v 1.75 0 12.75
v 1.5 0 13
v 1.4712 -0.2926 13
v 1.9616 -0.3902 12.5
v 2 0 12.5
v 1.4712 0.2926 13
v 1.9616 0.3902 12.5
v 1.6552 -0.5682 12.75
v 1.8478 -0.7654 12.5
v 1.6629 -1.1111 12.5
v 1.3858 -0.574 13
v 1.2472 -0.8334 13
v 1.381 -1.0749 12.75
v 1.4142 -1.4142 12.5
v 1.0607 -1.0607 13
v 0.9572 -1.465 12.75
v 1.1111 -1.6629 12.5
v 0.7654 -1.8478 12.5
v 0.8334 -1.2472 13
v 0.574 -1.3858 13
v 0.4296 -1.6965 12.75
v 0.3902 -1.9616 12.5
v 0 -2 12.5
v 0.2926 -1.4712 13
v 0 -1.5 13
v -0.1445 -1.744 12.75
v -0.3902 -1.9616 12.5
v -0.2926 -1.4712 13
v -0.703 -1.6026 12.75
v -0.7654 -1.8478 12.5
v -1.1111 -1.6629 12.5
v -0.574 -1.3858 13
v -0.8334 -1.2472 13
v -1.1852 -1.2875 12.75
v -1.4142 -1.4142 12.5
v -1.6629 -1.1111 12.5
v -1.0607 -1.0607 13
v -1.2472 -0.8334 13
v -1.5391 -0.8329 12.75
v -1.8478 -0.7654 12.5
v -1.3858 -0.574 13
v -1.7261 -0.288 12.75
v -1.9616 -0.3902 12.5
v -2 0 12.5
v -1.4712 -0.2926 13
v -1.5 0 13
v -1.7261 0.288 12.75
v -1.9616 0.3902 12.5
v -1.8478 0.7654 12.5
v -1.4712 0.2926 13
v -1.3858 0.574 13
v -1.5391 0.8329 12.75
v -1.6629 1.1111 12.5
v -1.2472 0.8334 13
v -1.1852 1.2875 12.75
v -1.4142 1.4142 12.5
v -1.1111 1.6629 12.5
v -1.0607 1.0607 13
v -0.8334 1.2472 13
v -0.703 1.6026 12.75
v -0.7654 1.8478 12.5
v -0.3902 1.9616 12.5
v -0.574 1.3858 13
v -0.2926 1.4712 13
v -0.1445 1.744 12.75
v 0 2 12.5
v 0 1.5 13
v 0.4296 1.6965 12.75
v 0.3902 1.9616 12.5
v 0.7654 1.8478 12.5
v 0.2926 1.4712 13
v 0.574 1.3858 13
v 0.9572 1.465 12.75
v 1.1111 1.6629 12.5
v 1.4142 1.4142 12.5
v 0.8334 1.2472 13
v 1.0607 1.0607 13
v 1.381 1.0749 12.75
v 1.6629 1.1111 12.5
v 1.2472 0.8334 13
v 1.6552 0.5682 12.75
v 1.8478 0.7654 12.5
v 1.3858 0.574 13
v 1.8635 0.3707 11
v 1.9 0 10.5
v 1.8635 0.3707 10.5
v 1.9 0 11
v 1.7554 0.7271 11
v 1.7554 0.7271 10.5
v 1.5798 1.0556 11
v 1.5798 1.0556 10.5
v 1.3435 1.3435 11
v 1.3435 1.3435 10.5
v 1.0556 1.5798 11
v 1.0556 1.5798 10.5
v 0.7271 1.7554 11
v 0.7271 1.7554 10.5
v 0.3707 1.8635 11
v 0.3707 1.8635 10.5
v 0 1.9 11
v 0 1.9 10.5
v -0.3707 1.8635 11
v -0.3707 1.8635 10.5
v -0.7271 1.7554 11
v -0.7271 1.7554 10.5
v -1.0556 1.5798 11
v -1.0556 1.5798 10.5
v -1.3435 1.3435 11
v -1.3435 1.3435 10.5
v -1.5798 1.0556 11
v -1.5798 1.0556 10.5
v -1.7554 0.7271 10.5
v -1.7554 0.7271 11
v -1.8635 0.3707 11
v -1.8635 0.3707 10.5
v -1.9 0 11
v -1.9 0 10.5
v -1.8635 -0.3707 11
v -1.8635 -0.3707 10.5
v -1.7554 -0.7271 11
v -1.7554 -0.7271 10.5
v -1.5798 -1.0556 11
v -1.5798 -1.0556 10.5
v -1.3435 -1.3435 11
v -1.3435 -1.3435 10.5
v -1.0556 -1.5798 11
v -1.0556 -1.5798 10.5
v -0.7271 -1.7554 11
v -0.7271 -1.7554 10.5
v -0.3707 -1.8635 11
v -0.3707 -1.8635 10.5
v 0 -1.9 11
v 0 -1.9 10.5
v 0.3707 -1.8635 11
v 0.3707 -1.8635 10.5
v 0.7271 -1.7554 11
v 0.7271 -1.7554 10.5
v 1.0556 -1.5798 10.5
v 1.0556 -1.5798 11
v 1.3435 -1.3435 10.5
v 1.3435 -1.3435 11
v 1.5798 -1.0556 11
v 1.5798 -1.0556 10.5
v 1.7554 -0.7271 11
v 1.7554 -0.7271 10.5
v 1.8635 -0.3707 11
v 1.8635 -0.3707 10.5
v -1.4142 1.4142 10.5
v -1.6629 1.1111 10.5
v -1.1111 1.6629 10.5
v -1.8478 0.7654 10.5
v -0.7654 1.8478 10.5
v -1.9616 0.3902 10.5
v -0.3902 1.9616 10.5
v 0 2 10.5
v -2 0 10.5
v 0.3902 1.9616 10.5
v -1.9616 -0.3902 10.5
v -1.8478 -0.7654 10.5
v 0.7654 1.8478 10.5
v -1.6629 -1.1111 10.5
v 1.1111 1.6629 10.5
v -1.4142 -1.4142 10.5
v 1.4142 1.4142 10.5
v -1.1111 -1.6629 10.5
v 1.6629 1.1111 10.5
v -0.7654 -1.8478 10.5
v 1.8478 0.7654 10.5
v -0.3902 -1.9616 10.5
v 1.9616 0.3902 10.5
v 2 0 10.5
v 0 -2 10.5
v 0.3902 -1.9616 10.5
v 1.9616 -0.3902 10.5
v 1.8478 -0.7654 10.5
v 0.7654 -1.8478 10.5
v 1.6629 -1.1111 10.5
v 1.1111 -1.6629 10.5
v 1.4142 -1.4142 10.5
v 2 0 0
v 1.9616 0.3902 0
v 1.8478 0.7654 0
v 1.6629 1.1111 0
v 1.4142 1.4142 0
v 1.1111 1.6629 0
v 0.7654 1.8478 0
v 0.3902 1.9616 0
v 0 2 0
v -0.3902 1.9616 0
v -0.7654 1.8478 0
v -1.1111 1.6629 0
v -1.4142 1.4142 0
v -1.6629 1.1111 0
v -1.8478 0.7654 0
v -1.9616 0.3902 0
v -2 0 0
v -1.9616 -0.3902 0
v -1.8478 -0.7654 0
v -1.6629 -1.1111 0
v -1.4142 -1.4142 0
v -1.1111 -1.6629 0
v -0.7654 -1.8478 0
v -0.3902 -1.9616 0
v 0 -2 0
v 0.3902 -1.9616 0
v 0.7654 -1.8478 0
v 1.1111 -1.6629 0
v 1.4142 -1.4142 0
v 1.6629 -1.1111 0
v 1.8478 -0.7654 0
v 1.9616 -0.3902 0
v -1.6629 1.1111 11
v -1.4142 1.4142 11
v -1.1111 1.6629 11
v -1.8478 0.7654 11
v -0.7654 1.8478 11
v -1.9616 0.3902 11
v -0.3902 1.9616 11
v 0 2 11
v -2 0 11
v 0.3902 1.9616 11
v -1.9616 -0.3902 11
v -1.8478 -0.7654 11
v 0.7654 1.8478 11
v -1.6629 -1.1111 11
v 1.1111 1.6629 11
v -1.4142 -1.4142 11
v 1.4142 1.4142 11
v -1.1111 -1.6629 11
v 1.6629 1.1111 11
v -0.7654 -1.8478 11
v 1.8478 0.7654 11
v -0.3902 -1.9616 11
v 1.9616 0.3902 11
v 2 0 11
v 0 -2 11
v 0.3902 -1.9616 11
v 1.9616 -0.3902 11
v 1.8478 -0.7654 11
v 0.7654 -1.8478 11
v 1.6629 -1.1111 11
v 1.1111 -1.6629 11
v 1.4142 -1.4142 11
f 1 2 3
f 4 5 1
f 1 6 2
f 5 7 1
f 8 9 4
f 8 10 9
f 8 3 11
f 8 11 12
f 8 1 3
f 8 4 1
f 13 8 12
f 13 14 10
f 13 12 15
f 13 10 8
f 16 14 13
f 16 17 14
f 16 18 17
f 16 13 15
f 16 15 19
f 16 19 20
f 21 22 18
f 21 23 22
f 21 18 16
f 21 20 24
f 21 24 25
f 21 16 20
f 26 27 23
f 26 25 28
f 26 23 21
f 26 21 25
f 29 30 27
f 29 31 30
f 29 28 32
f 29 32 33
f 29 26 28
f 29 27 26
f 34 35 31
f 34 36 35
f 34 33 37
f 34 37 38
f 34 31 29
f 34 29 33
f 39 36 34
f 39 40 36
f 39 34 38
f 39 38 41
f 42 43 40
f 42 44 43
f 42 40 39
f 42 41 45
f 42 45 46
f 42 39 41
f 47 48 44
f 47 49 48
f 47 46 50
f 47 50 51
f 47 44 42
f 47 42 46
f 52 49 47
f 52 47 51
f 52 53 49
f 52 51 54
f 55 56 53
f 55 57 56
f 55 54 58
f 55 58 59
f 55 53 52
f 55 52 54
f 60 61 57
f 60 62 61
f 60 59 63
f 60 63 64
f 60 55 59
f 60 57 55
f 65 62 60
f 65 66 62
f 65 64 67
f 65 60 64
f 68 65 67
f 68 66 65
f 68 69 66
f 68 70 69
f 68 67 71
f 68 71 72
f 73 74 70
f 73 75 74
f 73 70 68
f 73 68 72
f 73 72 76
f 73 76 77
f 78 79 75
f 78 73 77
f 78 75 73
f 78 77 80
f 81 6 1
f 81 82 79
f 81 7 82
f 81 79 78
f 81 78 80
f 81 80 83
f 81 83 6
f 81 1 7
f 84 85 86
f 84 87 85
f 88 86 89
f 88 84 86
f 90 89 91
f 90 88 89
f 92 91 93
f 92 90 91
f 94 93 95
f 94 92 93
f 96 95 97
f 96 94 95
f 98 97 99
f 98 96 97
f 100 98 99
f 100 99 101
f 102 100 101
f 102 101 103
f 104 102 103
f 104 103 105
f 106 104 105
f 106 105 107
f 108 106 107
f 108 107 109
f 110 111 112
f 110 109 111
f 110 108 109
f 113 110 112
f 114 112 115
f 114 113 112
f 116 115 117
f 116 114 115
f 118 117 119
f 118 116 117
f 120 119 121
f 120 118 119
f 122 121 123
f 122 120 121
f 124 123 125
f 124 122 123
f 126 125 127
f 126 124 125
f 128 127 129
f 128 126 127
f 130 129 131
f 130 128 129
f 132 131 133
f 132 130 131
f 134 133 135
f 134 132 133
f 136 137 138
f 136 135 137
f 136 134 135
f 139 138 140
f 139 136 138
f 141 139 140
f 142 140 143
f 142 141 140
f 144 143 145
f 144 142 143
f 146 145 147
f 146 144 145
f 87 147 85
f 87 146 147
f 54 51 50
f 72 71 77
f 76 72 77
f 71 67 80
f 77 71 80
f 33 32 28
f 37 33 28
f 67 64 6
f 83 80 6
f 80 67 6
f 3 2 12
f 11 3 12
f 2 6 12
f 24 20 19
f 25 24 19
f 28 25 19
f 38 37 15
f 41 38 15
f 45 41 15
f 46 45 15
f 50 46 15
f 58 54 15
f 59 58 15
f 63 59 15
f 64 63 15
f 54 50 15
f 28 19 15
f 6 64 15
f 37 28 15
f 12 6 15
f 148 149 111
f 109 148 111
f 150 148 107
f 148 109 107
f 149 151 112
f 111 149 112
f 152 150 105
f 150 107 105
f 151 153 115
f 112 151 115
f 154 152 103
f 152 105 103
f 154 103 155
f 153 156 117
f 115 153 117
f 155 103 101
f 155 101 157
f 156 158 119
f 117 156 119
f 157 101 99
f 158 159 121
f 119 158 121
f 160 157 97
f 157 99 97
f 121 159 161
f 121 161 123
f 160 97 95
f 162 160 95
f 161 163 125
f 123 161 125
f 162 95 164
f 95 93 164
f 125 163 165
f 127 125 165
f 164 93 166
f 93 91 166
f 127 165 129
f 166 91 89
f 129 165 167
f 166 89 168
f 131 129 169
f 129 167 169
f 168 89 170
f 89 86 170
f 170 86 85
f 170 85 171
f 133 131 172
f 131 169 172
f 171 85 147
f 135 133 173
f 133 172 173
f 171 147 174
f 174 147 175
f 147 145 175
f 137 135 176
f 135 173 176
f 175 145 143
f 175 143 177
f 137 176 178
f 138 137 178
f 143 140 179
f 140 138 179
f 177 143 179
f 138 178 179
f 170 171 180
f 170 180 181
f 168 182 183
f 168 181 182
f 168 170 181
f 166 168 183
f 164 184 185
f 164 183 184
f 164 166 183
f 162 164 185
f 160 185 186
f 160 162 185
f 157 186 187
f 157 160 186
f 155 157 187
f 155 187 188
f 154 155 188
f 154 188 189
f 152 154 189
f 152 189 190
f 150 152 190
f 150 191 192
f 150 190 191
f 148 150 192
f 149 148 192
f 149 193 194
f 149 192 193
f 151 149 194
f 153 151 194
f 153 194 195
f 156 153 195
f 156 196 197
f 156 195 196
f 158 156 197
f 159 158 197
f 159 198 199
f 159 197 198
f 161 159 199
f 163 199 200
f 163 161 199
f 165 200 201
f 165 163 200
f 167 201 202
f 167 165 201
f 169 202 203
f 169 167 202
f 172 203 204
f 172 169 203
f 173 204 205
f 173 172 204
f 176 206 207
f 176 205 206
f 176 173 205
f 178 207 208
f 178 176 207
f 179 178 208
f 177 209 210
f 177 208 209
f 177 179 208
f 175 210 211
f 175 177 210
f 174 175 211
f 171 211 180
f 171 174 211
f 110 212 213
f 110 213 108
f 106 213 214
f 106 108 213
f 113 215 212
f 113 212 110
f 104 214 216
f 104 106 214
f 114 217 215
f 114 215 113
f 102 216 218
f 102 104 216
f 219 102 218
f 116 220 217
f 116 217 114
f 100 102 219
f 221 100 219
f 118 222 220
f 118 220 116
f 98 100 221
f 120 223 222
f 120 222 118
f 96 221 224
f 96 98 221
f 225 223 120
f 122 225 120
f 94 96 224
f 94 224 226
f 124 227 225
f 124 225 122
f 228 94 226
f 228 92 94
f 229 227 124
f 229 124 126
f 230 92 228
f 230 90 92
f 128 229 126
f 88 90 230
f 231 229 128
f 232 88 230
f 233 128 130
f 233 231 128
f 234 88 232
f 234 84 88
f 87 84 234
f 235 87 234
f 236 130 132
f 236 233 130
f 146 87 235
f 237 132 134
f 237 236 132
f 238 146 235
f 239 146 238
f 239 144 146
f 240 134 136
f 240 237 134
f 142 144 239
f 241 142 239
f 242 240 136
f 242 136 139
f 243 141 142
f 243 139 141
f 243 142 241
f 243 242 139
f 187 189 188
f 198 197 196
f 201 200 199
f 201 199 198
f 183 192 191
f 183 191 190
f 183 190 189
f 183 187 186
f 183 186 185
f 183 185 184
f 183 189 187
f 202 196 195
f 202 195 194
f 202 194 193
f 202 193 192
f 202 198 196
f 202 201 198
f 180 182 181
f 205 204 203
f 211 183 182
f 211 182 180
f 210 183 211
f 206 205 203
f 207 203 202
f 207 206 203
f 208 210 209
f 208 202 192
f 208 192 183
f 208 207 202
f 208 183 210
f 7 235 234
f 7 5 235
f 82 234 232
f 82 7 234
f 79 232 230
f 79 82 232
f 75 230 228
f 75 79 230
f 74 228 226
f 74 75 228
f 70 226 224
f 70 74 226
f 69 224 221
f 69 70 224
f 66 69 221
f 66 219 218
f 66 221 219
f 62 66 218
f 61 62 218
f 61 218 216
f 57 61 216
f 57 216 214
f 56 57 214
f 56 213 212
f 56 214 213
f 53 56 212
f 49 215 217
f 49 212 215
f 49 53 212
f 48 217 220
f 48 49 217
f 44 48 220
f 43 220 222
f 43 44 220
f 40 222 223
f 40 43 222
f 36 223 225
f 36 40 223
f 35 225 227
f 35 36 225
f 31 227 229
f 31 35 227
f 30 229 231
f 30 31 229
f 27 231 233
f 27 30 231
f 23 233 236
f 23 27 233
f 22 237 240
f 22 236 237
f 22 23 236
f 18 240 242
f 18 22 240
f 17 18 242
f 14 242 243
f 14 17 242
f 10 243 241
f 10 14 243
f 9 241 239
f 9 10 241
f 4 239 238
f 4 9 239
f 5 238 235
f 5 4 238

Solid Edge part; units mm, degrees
sketch "Sketch1" plane through (0, 0, 0) normal (0, -1, 0) x (1, 0, 0)
  line L0 (0, 0) -> (2, 0)
  line L1 (2, 0) -> (2, 10.5)
  line L2 (1.9, 10.5) -> (2, 10.5)
  line L3 (1.9, 10.5) -> (1.9, 11)
  line L4 (2, 11) -> (1.9, 11)
  line L5 (2, 11) -> (2, 12.5)
  line L6 (2, 12.5) -> (1.5, 13)
  line L7 (1.5, 13) -> (0, 13)
revolve "RevolvedProtrusion1" add sketch "Sketch1" angle 360 about axis through (0, 0, 13) along (0, 0, -1)
